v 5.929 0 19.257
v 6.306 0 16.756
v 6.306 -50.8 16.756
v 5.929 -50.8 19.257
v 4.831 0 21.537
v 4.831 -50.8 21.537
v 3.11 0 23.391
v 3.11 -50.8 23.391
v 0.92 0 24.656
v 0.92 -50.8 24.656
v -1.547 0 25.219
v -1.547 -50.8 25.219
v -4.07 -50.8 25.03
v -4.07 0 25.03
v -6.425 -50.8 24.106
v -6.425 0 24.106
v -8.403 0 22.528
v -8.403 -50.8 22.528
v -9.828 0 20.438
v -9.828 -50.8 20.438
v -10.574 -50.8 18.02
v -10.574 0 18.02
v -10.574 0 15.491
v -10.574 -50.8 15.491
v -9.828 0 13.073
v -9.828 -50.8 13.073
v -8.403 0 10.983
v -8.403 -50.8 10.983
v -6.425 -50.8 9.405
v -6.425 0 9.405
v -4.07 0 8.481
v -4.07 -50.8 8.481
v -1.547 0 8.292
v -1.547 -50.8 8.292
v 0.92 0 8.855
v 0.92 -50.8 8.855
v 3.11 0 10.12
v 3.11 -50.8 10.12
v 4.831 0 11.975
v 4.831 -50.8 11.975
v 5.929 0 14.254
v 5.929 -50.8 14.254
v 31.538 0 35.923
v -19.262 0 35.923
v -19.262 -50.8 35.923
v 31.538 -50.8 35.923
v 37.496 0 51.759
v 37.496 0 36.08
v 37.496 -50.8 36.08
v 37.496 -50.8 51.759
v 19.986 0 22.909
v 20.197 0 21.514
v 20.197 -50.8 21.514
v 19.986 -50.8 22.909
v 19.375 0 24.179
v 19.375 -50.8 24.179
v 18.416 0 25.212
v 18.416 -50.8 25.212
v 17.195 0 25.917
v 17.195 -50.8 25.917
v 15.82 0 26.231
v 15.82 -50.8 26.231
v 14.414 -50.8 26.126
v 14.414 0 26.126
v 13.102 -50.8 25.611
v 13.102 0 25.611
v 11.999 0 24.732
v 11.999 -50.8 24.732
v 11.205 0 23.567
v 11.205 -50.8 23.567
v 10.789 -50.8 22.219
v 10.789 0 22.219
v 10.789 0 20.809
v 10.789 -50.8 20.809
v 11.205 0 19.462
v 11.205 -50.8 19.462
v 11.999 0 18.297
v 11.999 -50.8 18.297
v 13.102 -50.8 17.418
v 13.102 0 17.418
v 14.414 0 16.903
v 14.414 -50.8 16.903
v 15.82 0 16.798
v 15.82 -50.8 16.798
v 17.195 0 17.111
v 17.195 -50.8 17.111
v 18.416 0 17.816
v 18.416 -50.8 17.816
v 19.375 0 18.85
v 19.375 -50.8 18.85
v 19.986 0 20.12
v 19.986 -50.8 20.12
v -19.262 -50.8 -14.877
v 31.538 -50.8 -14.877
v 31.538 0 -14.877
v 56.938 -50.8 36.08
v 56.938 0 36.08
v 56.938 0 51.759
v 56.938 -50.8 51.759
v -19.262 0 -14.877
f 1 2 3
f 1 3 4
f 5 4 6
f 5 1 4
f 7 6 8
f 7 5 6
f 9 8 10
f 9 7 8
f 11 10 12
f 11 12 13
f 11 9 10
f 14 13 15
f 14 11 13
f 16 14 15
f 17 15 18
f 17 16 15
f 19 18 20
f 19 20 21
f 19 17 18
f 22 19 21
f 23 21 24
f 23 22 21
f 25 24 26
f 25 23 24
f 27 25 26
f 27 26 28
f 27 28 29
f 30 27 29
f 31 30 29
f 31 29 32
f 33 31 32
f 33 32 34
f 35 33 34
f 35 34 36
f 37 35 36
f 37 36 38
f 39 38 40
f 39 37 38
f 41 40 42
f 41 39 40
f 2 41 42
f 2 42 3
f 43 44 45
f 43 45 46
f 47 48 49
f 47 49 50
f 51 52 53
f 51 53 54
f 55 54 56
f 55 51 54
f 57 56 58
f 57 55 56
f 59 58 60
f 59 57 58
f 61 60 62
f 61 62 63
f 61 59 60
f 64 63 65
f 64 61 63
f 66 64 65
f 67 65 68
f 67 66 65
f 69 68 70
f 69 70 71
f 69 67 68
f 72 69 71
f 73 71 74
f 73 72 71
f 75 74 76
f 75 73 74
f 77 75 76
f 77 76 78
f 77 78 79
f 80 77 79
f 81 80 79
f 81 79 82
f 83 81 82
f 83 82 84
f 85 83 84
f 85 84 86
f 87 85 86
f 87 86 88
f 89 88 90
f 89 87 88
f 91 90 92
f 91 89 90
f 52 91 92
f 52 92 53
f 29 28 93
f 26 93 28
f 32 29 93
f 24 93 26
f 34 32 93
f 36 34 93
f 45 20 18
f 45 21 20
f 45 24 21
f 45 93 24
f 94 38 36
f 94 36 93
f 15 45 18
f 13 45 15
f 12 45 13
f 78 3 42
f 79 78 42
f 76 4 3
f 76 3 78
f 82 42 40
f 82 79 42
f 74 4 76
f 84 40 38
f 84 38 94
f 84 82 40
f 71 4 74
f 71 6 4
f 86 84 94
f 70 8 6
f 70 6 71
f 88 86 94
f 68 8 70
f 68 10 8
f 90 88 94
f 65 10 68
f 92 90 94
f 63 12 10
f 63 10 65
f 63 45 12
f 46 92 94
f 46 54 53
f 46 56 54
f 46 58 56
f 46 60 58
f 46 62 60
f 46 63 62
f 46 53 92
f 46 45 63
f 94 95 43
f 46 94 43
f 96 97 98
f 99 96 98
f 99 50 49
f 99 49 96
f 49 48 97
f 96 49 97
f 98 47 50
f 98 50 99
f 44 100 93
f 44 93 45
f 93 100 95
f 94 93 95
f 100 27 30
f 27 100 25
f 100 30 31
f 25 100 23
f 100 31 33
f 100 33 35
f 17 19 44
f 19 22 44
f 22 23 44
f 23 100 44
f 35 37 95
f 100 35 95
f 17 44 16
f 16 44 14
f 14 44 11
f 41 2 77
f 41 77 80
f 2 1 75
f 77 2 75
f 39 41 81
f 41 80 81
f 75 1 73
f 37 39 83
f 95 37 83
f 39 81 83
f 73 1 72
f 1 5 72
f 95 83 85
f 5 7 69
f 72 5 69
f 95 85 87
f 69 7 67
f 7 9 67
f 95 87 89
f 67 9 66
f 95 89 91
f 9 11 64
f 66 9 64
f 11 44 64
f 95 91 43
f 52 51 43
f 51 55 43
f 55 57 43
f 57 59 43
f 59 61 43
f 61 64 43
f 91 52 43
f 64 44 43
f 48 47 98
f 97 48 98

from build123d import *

# Parameters (mm, degrees)
F0_W     = 19.441969
F0_H     = 15.67901
F0_W_2   = 50.8
F0_H_2   = 50.8
F0_R     = 8.487181
F0_R_2   = 4.729954
F1_DEPTH = 50.8


with BuildPart() as f1:
    # F0 (on Front) → F1 (new body)
    with BuildSketch(Plane.XZ):
        with Locations((47.216558, 43.919361)):
            Rectangle(F0_W, F0_H)
        with Locations((6.137546, 10.523065)):
            Rectangle(F0_W_2, F0_H_2)
        with Locations((-2.18119, 16.755503)):
            Circle(F0_R, mode=Mode.SUBTRACT)
        with Locations((15.466618, 21.51446)):
            Circle(F0_R_2, mode=Mode.SUBTRACT)
    extrude(amount=F1_DEPTH)


solid = f1.part
